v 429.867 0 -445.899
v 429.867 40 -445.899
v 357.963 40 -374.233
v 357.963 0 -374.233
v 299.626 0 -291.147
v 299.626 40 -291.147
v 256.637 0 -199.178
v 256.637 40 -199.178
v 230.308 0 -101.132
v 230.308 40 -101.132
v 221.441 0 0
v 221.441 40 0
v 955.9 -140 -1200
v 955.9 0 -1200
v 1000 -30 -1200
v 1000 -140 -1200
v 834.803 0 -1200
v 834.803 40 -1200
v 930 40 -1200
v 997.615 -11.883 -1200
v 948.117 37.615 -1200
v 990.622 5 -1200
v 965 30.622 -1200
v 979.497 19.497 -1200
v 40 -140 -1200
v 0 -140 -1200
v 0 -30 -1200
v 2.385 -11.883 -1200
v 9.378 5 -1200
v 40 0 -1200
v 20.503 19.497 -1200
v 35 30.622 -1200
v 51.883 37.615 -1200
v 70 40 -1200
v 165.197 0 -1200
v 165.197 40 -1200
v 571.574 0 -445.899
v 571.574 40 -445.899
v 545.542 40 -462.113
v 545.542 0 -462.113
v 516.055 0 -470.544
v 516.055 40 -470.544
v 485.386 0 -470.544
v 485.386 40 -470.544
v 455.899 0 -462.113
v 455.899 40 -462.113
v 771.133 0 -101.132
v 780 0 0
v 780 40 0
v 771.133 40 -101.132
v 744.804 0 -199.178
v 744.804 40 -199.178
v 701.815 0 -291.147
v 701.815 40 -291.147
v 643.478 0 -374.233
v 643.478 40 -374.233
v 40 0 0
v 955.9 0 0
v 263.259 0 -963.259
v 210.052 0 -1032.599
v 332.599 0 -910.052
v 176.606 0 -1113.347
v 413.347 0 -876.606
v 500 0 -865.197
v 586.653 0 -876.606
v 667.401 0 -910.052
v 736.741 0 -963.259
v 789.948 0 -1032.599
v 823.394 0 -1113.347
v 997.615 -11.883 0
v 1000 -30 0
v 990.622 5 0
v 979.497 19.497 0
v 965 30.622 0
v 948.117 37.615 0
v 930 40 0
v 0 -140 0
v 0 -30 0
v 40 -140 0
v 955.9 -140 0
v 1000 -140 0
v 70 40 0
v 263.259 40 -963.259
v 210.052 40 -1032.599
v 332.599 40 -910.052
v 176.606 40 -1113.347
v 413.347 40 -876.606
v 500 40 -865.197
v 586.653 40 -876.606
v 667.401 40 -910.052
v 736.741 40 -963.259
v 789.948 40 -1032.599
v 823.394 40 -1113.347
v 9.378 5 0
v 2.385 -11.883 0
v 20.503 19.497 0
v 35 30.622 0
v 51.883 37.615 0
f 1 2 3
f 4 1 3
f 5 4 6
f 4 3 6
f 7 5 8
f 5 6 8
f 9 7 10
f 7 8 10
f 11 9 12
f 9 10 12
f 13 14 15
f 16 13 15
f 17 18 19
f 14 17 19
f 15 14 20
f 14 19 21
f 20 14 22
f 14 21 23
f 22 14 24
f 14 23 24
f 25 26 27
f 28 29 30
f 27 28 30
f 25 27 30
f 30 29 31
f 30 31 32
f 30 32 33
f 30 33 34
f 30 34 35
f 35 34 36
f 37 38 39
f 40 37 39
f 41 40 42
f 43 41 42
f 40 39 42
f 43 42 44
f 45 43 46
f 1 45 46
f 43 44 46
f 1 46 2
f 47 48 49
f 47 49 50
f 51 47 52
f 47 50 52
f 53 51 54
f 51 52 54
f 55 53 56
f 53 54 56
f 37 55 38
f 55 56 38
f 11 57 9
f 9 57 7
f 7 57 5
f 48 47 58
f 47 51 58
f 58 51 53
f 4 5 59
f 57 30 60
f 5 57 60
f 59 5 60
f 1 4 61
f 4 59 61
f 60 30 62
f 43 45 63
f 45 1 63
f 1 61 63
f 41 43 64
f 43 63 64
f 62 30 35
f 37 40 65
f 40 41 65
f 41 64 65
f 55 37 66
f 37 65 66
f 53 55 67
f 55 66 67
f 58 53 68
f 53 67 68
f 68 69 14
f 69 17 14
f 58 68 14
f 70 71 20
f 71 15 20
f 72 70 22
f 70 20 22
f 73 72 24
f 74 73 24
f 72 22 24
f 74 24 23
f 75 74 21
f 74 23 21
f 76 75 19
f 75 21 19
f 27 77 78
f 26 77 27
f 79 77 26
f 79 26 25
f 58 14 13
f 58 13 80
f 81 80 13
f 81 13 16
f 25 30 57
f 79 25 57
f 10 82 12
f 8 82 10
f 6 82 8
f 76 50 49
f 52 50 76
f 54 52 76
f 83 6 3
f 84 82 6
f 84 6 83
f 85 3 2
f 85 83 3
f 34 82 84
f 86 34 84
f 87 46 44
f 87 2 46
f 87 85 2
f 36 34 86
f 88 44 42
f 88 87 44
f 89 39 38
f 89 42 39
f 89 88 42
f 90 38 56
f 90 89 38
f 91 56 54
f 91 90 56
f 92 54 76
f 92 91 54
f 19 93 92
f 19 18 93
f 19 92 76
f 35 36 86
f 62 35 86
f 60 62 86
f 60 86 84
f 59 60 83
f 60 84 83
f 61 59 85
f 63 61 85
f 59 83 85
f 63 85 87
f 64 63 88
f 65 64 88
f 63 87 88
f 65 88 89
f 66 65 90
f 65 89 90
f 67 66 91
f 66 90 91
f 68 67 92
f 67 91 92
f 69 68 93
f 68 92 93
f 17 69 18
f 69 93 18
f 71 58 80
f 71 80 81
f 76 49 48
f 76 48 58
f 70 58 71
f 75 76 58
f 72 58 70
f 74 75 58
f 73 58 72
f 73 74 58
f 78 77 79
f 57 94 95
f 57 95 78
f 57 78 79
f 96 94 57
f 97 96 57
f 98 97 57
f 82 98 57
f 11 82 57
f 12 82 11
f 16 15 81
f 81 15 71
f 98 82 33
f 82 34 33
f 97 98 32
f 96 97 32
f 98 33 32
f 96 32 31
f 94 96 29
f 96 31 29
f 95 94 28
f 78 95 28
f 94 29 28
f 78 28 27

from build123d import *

# Parameters (mm, degrees)
SKETCH1_W           = 1000
SKETCH1_H           = 1200
BOSS_EXTRUDE1_DEPTH = 40
SKETCH2_W           = 44.100266395
SKETCH2_H           = 1200
SKETCH2_W_2         = 40
BOSS_EXTRUDE2_DEPTH = 140
FILLET1_R           = 70
SKETCH3_R           = 334.802588384
CUT_EXTRUDE2_DEPTH  = 140


with BuildPart() as part:
    # Sketch1 → Boss-Extrude1 (new body)
    with BuildSketch(Plane(origin=(0, 0, 0), x_dir=(1, 0, 0), z_dir=(0, 1, 0))):
        with Locations((500, 600)):
            Rectangle(SKETCH1_W, SKETCH1_H)
    extrude(amount=BOSS_EXTRUDE1_DEPTH)

    # Sketch2 → Boss-Extrude2 (add)
    with BuildSketch(Plane.XZ):
        with Locations((977.949866803, -600)):
            Rectangle(SKETCH2_W, SKETCH2_H)
        with Locations((20, -600)):
            Rectangle(SKETCH2_W_2, SKETCH2_H)
    extrude(amount=BOSS_EXTRUDE2_DEPTH)

    # Fillet1
    fillet1_edges = [part.edges().sort_by_distance(p)[0] for p in [
        (1000, 40, -600),
        (0, 40, -600),
    ]]
    fillet(fillet1_edges, radius=FILLET1_R)

    # Sketch3 → Cut-Extrude2 (cut)
    with BuildSketch(Plane(origin=(0, 40, 0), x_dir=(1, 0, 0), z_dir=(0, 1, 0))):
        with Locations((500, 1200)):
            Circle(SKETCH3_R)
        with BuildLine():
            Line((221.441080201, 0), (780, 0))
            ThreePointArc((780, 0), (725.321357402, 246.103392604), (571.573934725, 445.899197935))
            ThreePointArc((571.573934725, 445.899197935), (500.7205401, 471.613897531), (429.867145476, 445.899197935))
            ThreePointArc((429.867145476, 445.899197935), (276.119722799, 246.103392604), (221.441080201, 0))
        make_face()
    extrude(amount=-CUT_EXTRUDE2_DEPTH, mode=Mode.SUBTRACT)


solid = part.part
